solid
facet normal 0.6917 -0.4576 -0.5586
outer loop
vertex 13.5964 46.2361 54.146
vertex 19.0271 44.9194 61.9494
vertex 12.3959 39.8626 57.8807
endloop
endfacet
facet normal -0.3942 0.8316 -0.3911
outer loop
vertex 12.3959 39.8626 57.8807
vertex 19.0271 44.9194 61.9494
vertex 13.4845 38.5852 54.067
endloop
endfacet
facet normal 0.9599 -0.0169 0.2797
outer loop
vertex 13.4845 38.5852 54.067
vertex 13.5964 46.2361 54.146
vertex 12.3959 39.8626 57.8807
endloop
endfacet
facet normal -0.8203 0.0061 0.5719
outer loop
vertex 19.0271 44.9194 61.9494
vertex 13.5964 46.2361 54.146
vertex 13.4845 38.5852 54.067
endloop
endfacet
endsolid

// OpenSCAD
// Auto-generated auxetic polyhedron
points = [
    [12.395901, 39.862555, 57.880695],
    [19.027110, 44.919397, 61.949418],
    [13.596412, 46.236146, 54.146020],
    [13.484493, 38.585151, 54.067013],
];

faces = [
    [0, 1, 2],
    [3, 1, 0],
    [0, 2, 3],
    [3, 2, 1],
];

polyhedron(points = points, faces = faces);
